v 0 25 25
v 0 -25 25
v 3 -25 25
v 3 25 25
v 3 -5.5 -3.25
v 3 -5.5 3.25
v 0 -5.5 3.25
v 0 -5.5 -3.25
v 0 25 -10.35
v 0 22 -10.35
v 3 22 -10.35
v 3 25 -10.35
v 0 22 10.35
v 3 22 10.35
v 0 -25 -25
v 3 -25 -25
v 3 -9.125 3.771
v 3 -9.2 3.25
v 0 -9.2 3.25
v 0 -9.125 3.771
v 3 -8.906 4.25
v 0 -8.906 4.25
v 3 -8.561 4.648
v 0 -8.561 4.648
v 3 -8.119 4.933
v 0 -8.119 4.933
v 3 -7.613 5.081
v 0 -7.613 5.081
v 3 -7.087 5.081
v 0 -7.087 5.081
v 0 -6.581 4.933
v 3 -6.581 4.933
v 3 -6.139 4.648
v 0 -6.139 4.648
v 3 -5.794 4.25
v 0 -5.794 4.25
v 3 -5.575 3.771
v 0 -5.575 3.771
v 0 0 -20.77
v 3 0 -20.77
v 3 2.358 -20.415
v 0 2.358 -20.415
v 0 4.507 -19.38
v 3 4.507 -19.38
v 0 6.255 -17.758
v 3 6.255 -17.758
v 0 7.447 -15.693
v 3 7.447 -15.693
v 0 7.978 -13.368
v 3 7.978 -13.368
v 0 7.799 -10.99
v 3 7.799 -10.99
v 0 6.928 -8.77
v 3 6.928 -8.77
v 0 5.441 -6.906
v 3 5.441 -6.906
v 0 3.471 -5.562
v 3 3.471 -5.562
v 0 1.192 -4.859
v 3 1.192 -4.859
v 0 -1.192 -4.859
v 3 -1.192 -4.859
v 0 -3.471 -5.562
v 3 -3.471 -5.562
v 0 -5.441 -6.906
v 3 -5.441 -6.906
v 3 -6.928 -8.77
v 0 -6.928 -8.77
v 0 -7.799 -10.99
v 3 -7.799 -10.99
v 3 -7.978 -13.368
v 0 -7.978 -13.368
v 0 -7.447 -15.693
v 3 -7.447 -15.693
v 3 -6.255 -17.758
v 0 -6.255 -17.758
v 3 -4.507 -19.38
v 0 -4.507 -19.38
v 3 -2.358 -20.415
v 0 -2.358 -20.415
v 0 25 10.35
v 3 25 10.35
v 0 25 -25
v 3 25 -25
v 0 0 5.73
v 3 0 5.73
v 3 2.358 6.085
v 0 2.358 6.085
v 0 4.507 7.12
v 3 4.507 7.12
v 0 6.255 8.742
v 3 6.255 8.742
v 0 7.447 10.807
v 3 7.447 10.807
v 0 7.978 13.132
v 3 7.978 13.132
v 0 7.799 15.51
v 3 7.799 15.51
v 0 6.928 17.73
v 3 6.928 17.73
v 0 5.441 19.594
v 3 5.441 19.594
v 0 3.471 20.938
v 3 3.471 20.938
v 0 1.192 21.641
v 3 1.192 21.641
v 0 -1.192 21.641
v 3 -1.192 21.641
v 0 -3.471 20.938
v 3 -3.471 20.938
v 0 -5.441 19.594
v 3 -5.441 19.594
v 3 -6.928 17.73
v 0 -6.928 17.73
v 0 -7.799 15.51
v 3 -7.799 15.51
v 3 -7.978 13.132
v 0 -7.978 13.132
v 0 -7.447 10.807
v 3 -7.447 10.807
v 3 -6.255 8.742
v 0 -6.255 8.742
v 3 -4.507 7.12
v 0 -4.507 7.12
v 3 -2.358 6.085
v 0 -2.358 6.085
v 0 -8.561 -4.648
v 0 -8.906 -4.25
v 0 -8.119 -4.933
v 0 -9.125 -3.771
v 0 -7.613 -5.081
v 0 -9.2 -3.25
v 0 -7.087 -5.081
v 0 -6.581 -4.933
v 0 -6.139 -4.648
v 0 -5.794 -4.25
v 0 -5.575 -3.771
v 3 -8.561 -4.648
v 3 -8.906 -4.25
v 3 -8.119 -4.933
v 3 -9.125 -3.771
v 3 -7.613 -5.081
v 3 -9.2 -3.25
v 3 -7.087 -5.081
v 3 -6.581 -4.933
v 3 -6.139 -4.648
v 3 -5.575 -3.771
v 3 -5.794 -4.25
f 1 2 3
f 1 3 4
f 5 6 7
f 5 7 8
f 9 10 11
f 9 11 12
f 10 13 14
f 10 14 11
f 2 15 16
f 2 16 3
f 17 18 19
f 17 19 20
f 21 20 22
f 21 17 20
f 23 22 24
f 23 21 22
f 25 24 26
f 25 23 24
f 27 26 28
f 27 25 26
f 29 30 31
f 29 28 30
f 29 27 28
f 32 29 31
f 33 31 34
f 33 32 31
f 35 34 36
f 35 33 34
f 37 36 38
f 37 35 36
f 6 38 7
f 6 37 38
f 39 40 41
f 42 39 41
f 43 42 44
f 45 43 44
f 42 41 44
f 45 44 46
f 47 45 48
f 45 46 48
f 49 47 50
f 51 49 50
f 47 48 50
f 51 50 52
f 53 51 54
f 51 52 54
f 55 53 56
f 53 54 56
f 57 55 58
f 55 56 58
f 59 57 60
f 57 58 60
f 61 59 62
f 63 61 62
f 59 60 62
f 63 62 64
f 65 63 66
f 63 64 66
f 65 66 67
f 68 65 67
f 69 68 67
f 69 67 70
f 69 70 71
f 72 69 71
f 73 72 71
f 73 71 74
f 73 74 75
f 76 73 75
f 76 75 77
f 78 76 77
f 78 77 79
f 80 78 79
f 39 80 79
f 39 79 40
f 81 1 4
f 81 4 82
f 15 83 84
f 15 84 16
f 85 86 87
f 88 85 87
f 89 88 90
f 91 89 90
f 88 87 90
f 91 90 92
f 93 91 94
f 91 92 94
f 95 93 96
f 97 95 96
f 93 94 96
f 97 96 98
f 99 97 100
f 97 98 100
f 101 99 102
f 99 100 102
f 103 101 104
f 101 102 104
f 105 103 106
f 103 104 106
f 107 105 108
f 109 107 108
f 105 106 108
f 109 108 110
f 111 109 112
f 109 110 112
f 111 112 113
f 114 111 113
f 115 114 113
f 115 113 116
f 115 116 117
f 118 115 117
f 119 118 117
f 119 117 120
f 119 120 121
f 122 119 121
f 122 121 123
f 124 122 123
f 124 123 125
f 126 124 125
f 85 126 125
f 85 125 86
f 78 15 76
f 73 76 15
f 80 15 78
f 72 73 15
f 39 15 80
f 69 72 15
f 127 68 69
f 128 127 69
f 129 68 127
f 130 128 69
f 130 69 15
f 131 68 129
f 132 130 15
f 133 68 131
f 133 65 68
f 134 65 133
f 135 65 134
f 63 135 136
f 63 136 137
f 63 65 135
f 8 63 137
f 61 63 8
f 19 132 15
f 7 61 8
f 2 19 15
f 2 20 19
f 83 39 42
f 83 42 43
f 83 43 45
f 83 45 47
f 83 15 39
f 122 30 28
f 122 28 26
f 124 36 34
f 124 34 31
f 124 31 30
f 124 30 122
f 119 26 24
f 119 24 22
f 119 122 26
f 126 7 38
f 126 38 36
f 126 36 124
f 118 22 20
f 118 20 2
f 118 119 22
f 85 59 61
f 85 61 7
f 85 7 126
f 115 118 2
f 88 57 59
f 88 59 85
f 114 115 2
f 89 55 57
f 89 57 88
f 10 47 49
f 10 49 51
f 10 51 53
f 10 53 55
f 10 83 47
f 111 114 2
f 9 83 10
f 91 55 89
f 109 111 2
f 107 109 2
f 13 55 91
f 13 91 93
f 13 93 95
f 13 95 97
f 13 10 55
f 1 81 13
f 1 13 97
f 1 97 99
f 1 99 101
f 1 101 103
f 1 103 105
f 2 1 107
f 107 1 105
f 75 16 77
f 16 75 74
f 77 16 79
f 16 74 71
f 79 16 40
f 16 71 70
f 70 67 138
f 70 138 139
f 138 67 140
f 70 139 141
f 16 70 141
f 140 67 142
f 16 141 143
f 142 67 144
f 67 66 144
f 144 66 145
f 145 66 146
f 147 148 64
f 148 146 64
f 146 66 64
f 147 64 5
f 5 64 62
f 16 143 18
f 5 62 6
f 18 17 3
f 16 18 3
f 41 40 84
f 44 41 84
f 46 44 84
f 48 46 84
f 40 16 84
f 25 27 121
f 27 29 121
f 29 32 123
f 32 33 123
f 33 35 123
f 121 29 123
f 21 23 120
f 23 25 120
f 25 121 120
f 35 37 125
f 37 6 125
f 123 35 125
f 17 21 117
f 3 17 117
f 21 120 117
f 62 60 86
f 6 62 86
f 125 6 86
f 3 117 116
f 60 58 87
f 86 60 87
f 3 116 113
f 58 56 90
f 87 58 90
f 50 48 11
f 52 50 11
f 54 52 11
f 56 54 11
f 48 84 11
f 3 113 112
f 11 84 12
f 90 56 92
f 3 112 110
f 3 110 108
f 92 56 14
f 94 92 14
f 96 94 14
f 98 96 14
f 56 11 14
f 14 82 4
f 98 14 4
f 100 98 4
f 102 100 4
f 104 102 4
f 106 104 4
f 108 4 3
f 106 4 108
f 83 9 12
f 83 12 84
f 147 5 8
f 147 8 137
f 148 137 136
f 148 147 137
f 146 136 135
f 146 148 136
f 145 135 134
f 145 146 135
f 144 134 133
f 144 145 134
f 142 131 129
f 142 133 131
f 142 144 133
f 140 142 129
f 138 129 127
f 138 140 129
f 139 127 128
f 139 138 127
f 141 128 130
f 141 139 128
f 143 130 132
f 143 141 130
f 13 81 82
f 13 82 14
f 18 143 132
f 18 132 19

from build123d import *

# Parameters (mm, degrees)
BOSS_EXTRUDE1_DEPTH = 3
SKETCH2_R           = 8
CUT_EXTRUDE1_DEPTH  = 36.482389998


with BuildPart() as part:
    # Sketch1 → Boss-Extrude1 (new body)
    with BuildSketch(Plane(origin=(0, 0, 0), x_dir=(0, 0, -1), z_dir=(1, 0, 0))):
        Polygon((-25, 25), (-10.35, 25), (-10.35, 22), (10.35, 22), (10.35, 25), (25, 25), (25, -25), (-25, -25), align=None)
    extrude(amount=BOSS_EXTRUDE1_DEPTH)

    # Sketch2 → Cut-Extrude1 (cut, through all)
    with BuildSketch(Plane(origin=(3, 0, 0), x_dir=(0, 0, -1), z_dir=(1, 0, 0))):
        with Locations((-13.73, 0)):
            Circle(SKETCH2_R)
        with Locations((12.77, 0)):
            Circle(SKETCH2_R)
        with BuildLine():
            Line((-3.25, -5.5), (3.25, -5.5))
            ThreePointArc((3.25, -5.5), (5.1, -7.35), (3.25, -9.2))
            Line((3.25, -9.2), (-3.25, -9.2))
            ThreePointArc((-3.25, -9.2), (-5.1, -7.35), (-3.25, -5.5))
        make_face()
    extrude(amount=-CUT_EXTRUDE1_DEPTH, mode=Mode.SUBTRACT)


solid = part.part
